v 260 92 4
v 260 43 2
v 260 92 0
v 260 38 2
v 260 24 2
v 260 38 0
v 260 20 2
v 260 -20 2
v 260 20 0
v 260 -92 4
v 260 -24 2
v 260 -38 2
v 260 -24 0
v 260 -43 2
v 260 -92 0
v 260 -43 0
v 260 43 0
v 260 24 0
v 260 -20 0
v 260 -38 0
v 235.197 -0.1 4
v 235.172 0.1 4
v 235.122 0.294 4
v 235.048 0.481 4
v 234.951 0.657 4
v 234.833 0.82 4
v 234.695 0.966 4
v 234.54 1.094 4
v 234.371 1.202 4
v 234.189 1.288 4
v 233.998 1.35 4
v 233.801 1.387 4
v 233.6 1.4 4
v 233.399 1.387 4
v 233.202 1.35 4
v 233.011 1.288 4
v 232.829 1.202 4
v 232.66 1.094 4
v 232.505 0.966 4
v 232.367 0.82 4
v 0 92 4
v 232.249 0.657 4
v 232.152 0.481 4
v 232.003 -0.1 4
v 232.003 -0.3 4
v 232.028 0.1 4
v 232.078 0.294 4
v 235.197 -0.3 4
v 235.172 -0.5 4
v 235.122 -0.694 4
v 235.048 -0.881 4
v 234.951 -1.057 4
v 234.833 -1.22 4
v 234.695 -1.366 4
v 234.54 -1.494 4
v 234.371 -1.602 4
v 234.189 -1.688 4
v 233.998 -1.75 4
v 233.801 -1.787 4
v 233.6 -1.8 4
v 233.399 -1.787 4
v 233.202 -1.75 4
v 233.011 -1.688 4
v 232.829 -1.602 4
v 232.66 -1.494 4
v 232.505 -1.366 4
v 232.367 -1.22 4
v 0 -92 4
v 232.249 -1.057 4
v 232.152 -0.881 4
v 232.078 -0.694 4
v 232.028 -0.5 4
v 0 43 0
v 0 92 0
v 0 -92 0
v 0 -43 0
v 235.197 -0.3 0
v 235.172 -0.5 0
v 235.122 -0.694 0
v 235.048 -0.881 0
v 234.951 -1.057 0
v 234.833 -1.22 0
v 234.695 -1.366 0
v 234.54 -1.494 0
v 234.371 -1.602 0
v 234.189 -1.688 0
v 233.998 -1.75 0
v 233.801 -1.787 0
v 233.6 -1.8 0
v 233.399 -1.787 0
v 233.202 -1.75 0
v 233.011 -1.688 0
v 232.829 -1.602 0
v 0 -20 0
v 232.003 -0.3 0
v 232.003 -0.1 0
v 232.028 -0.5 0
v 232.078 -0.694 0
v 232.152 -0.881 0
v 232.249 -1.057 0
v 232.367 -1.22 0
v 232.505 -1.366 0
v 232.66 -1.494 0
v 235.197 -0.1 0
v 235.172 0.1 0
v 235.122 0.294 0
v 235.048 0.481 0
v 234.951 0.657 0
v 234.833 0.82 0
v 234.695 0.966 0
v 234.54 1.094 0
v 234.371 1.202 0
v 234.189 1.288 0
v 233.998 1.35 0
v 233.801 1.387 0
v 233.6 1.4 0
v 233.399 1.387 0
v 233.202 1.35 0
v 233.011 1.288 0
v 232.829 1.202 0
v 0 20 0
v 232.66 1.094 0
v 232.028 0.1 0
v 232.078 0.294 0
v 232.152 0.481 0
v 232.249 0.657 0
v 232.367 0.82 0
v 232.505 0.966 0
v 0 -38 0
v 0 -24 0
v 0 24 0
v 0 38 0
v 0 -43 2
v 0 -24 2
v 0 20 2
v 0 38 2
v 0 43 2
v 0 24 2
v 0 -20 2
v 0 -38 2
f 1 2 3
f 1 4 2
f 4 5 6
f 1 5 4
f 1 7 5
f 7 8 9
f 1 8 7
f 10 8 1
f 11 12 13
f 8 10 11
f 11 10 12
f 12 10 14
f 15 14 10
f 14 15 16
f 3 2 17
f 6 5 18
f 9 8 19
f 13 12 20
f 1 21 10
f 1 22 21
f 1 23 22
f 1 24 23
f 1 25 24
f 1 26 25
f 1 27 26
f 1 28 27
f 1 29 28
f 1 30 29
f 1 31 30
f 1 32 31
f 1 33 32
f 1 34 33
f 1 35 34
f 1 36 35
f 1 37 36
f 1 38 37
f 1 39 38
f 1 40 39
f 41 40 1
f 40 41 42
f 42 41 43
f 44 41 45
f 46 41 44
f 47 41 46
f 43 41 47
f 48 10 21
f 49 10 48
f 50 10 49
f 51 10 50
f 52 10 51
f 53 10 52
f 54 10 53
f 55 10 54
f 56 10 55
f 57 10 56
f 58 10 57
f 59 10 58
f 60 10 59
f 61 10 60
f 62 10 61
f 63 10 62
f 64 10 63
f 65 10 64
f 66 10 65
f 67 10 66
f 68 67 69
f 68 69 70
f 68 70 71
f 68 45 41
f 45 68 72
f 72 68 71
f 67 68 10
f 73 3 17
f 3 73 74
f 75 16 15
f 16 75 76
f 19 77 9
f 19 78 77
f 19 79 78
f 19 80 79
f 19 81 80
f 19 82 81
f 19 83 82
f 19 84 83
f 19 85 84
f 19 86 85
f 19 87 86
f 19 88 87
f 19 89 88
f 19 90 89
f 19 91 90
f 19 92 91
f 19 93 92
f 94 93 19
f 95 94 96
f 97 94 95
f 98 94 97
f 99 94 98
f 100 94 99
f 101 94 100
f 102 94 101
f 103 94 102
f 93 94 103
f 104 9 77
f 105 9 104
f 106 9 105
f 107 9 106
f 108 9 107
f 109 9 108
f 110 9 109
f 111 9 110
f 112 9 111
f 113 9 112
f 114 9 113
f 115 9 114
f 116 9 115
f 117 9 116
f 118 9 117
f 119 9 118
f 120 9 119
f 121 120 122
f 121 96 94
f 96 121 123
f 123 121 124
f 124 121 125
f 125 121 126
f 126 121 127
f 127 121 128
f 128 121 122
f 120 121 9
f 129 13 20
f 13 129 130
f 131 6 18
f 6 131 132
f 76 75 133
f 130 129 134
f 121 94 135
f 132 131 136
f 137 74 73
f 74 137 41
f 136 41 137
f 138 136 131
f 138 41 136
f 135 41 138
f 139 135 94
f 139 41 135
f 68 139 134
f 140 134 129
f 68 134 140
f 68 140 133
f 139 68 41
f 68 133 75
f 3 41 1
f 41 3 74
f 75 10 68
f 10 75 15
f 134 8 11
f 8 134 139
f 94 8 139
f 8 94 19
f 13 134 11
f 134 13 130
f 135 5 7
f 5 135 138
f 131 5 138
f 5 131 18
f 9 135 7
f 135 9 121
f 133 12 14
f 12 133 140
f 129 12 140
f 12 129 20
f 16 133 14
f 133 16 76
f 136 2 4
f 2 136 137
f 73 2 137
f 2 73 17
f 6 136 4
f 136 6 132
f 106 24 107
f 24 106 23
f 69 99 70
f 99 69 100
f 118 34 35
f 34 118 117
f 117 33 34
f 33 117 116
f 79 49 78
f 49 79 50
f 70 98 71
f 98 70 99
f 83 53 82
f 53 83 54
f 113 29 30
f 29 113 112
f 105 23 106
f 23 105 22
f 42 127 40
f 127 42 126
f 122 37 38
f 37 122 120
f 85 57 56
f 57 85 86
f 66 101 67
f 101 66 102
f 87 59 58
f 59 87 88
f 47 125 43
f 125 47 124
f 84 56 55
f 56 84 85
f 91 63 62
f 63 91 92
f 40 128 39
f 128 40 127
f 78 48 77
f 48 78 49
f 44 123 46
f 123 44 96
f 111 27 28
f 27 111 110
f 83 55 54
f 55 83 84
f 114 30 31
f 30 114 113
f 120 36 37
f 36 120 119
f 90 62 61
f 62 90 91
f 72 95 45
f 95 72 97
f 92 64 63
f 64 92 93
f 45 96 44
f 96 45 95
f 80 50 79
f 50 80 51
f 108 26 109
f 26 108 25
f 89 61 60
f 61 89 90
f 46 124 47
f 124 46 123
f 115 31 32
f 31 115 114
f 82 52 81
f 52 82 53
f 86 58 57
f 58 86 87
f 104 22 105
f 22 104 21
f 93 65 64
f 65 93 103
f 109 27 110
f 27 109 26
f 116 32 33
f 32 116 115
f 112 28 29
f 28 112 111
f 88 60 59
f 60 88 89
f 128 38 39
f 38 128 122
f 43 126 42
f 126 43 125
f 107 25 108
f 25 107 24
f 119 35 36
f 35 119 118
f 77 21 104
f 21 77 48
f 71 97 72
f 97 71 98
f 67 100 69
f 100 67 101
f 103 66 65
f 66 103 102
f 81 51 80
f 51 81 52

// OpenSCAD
// file: embase.scad
include <parametre.scad>

embase();

module embase() {
	
	// embase en elle-même
	translate([embase_decallage, embase_platine_epaisseur, 0]) union() {
		difference() {
			color([0.5, 0.5, 0]) union() {
				// connecteur externe
				cube(size=[embase_externe_largeur, embase_externe_hauteur, embase_externe_profondeur]);
				// partie basse intérieure
				translate([0, 0, embase_externe_profondeur])
					cube(size=[embase_externe_largeur, embase_externe_hauteur / 2, embase_interne_profondeur]);
				// partie supérieure intérieure
				translate([embase_externe_largeur / 2, embase_externe_hauteur / 2, embase_externe_profondeur])
					cylinder(embase_interne_profondeur, d=embase_externe_largeur, $fn=resolution);
			}
			
			// trou du connecteur
			translate([embase_externe_largeur / 2, embase_externe_marge_trou + embase_externe_diametre_trou / 2, - difference_objet_marge])
				cylinder(embase_interne_profondeur + difference_objet_marge, d=embase_externe_diametre_trou, $fn=resolution);
		}
		// pinouille de masse
		color([1, 1, 1]) translate([embase_externe_largeur / 2, embase_externe_marge_trou + embase_externe_diametre_trou / 2, 1])
			cylinder(embase_interne_profondeur, d=embase_externe_diametre_pin, $fn=resolution);

	}
	
	difference() {
		// platine
		translate([0, 0, embase_platine_decallage])
			cube(size=[embase_platine_largeur, embase_platine_epaisseur, embase_platine_profondeur]);

		// trou de la platine
		embase_fixation();
	}
}

module embase_trou() {
	translate([embase_decallage - padding_percage, embase_platine_epaisseur - padding_percage, -difference_objet_marge])
		// connecteur externe
		cube(size=[embase_externe_largeur + 2 * padding_percage, embase_externe_hauteur + 2 * padding_percage, embase_externe_profondeur + difference_objet_marge]);
	embase_fixation();
}

module embase_fixation() {
	rotate([90, 0, 0])
		translate([embase_platine_largeur / 2 - padding_percage, 
				embase_platine_decallage + embase_platine_profondeur - embase_diametre_fixation / 2 - embase_marge_fixation, 
				-embase_platine_epaisseur - difference_objet_marge / 2])
			// fixation platine
			cylinder(embase_platine_epaisseur + difference_objet_marge, d=embase_diametre_fixation + padding_percage, $fn=resolution);
}
// file: bouton_arcade.scad
include <parametre.scad>

bouton_arcade();

module bouton_arcade() {
	union() {
		cylinder(hauteur_bague_bouton_arcade, d=diametre_bouton_arcade, $fn=resolution);
		translate([0, 0, -hauteur_bouton_arcade])
			cylinder(hauteur_bouton_arcade, d=diametre_push_bouton_arcade, $fn=resolution);
	}
}

module trou_bouton_arcade(epaisseur) {
	translate([0, 0, -difference_objet_marge / 2])
		cylinder(epaisseur + difference_objet_marge, d=diametre_trou_bouton_arcade + padding_percage, $fn=resolution);
}
// file: parametre.scad
/* pour le rendu openscad */

// pour la finesse de rendu
// plus c'est élevé, mieux c'est... mais ça prend plus de temps et de ressource
resolution = 50;

// pour enlever de la matière des objets dans openscad et être certain qu'il ne reste pas un bout de face
difference_objet_marge = 20;

// pour afficher (1) ou pas (0) les accessoires installés
show_accessoires = 1;



/* pour le design du jeu  */

// tout est en millimetre !!!!

// configuration globale
////////////////////////

// quand on perce et que l'on va insérer quelque chose dedans...
// il faut un peu de vide en plus ;)
padding_percage = 0.2;

// espace supplémentaire pour la largeur de rainure
padding_rainure = 1;

// profondeur standard pour une rainure
profondeur_rainure = 2; // moins que epaisseur_tole_grille_led et que epaisseur_tole_grille_led ! Il faut qu'il reste de la matière !

// définition de base du jeu
nombre_colonnes = 7;
nombre_lignes = 6;


// les boutons de sélection de colonne et du nombre de joueurs
//////////////////////////////////////////////////////////////
diametre_bouton_arcade = 30;
rayon_bouton_arcade = diametre_bouton_arcade / 2;
diametre_trou_bouton_arcade = 20; // TODO: à valider !
rayon_trou_bouton_arcade = diametre_trou_bouton_arcade / 2;
hauteur_bague_bouton_arcade = 3;
hauteur_bouton_arcade = 1;
diametre_push_bouton_arcade = diametre_bouton_arcade - 4;


// bouton EC11
//////////////
diametre_bouton_ec11 = 14.4;
hauteur_bouton_ec11 = 13.1;
epaisseur_trait_ec11 = 1;
trou_axe_ec11 = 7;
espace_platine_bouton = 10.7;
hauteur_platine_ec11 = 33.4;
largeur_platine_ec11 = 27.5;
epaisseur_platine_ec11 = 1.3;
trou_fixation_ec11 = 3;
trou_marge_ec11 = 2.40;


// haut-parleur HP8R
////////////////////
HP8R_epaisseur_totale = 16.25;
HP8R_largeur = 36.24;
HP8R_hauteur = 75;
HP8R_epaisseur_tole = 1.63;
HP8R_hauteur_caisson = 71;
//HP8R_epaisseur_caisson = 16.25 - HP8R_epaisseur_tole;
HP8R_decalage_hauteur_trou = 12.3;
HP8R_largeur_trou = 27.1;
HP8R_hauteur_trou = 38.3;
HP8R_epaisseur_trou = HP8R_epaisseur_totale - 2;
HP8R_diametre_creuse_coins = 10;
HP8R_diametre_creuse_fixation = 3;
HP8R_marge_creuse_fixation = 1.6 + padding_percage;


// Embase alimentation
//////////////////////
embase_decallage = 3.3;
embase_externe_largeur = 8.95;
embase_externe_hauteur = 10.7;
embase_externe_profondeur = 3.5;
embase_externe_marge_trou = 3.3;
embase_externe_diametre_trou = 6.4;
embase_externe_diametre_pin = 1.6;
embase_interne_profondeur = 10.6;
embase_platine_profondeur = 25.5;
embase_platine_decallage = 5.6;
embase_platine_largeur = 25.9;
embase_platine_epaisseur = 1.6;
embase_marge_fixation = 1.5;
embase_diametre_fixation = 3;


// cadrillage autour des LEDs
/////////////////////////////
profondeur_separateur_led = 15; // TODO: à valider !


// pour stocker les cables et l'électronique
////////////////////////////////////////////
espace_vide_milieu = 40; // TODO: à valider !


// le mur Star Wars fenetré
///////////////////////////
epaisseur_tole_mur = 2;
taille_fenetre = diametre_bouton_arcade; // valeur à fixer si bouton plus petit, ici je m'adapte à cette taille de bouton
ecart_entre_fenetre = 5; // au jugé ;)
marge_mur = 10; // pour aérer le tour

// on peut maintenant calculer la surface du jeu !
largeur_mur = marge_mur + (nombre_colonnes * taille_fenetre) + ((nombre_colonnes - 1) * ecart_entre_fenetre) + marge_mur;
hauteur_mur = marge_mur + (nombre_lignes * taille_fenetre) + ((nombre_lignes - 1) * ecart_entre_fenetre) + marge_mur;
echo(str("** PLAQUE MUR (x2) : ", largeur_mur , " x ", hauteur_mur, " x ", epaisseur_tole_mur));


// la grille de LEDS
////////////////////
epaisseur_tole_grille_led = 3;
diametre_trou_led = 10; // TODO: à valider !
largeur_rainure_grille_led = epaisseur_tole_grille_led + padding_rainure;
profondeur_rainure_grille_led = profondeur_rainure; // moins que epaisseur_tole_grille_led !!!
echo(str("** PLAQUE GRILLE LED (x2) : ", largeur_mur , " x ", hauteur_mur, " x ", epaisseur_tole_grille_led));


// le plexi blanc derrière le mur, pour faire les fenêtres
//////////////////////////////////////////////////////////
epaisseur_plexi_blanc = 2;
transparence_plexi = 1;
echo(str("** PLAQUE PLEXI BLANC (x2) : ", largeur_mur , " x ", hauteur_mur, " x ", epaisseur_plexi_blanc));


// calcul de l'épaisseur complète du jeu
epaisseur_jeu = espace_vide_milieu + 2 * epaisseur_tole_mur + 2 * epaisseur_plexi_blanc + 2 * epaisseur_tole_grille_led + 2 * profondeur_separateur_led;


// la plaque du dessus avec les boutons de choix de colonne
///////////////////////////////////////////////////////////
epaisseur_tole_dessus = 4; // ce "chapeau" sera rainurée pour tenir les plaques !
debord_rainure = 5; // qui dépasse de devant et derrière 
profondeur_dessus = epaisseur_jeu + 2 * debord_rainure;
marge_largeur_dessus = (largeur_mur - (nombre_colonnes * diametre_bouton_arcade) - ((nombre_colonnes - 1) * ecart_entre_fenetre)) / 2;
largeur_rainure_mur_plexi = epaisseur_tole_mur + epaisseur_plexi_blanc + padding_rainure;
profondeur_rainure_mur_plexi = profondeur_rainure; // moins que epaisseur_tole_dessus !!!
echo(str("** PLAQUE DESSUS : ", largeur_mur , " x ", profondeur_dessus, " x ", epaisseur_tole_dessus));


// la plaque de dessous
///////////////////////
epaisseur_tole_dessous = 4; // ce socle sera rainurée pour tenir les plaques !
dessous_debord_rainure = 50;
profondeur_dessous = epaisseur_jeu + 2 * dessous_debord_rainure;
echo(str("** PLAQUE SOCLE : ", largeur_mur , " x ", profondeur_dessous, " x ", epaisseur_tole_dessous));


hauteur_cote = epaisseur_tole_dessous + hauteur_mur + epaisseur_tole_dessus - 2 * profondeur_rainure_grille_led;
largeur_cote = profondeur_dessus;

// côté gauche
//////////////
epaisseur_tole_gauche = 2;
echo(str("** PLAQUE COTE GAUCHE : ", largeur_cote , " x ", hauteur_cote, " x ", epaisseur_tole_gauche));


// côté droit
/////////////
epaisseur_tole_droit = 2;
position_ec11 = epaisseur_tole_dessous + embase_platine_epaisseur + embase_externe_hauteur + 15 + hauteur_platine_ec11 / 2; // 15 = taille d'une pinouille arduino connectée sur l'embase
echo(str("** PLAQUE COTE DROIT : ", largeur_cote , " x ", hauteur_cote, " x ", epaisseur_tole_droit));

position_haut_parleur_HP8R = position_ec11 + hauteur_platine_ec11 / 2 + 5;
// main file
include <parametre.scad>
use <bouton_arcade.scad>
use <embase.scad>

// pour exporter en .dxf
//projection(cut = false) dessous();

translate([0, -profondeur_dessous / 2, 0])
	dessous();

module dessous() {
    color([0, 0, 0]) {
        difference() {
            cube(size=[largeur_mur, profondeur_dessous, epaisseur_tole_dessous]);
			
						
			// rainure pour grille de LEDs
            translate([- difference_objet_marge / 2, 
					profondeur_dessous / 2 - largeur_rainure_grille_led - espace_vide_milieu / 2, 
					- difference_objet_marge])
                cube(size=[largeur_mur + difference_objet_marge, largeur_rainure_grille_led, profondeur_rainure_grille_led + difference_objet_marge]);

			// rainure pour grille de LEDs
            translate([- difference_objet_marge / 2, 
					profondeur_dessous / 2 + espace_vide_milieu / 2, 
					- difference_objet_marge])
                cube(size=[largeur_mur + difference_objet_marge, largeur_rainure_grille_led, profondeur_rainure_grille_led + difference_objet_marge]);

			
			// rainure pour plexi blanc et mur star wars
            translate([- difference_objet_marge / 2, 
					profondeur_dessous / 2 - largeur_rainure_mur_plexi - espace_vide_milieu / 2 - epaisseur_tole_grille_led - profondeur_separateur_led,
					-difference_objet_marge])
                cube(size=[largeur_mur + difference_objet_marge, largeur_rainure_mur_plexi, profondeur_rainure_mur_plexi + difference_objet_marge]);
				
			// rainure pour plexi blanc et mur star wars
            translate([- difference_objet_marge / 2, 
					profondeur_dessous / 2 + espace_vide_milieu / 2 + epaisseur_tole_grille_led + profondeur_separateur_led, 
					-difference_objet_marge])
                cube(size=[largeur_mur + difference_objet_marge, largeur_rainure_mur_plexi, profondeur_rainure_mur_plexi + difference_objet_marge]);


			// fixation de la platine de l'embase
			rotate([90, 180, 270])
				translate([profondeur_dessous / 2 - embase_platine_largeur / 2, 0, -1*padding_percage -largeur_mur - embase_externe_profondeur + epaisseur_tole_droit])
				embase_fixation(); 

        }
    }

			// fixation de la platine de l'embase
			/*rotate([90, 180, 270])
				translate([profondeur_dessous / 2 - embase_platine_largeur / 2, 0, -1*padding_percage -largeur_mur - embase_externe_profondeur + epaisseur_tole_droit])
				embase(); */
}
